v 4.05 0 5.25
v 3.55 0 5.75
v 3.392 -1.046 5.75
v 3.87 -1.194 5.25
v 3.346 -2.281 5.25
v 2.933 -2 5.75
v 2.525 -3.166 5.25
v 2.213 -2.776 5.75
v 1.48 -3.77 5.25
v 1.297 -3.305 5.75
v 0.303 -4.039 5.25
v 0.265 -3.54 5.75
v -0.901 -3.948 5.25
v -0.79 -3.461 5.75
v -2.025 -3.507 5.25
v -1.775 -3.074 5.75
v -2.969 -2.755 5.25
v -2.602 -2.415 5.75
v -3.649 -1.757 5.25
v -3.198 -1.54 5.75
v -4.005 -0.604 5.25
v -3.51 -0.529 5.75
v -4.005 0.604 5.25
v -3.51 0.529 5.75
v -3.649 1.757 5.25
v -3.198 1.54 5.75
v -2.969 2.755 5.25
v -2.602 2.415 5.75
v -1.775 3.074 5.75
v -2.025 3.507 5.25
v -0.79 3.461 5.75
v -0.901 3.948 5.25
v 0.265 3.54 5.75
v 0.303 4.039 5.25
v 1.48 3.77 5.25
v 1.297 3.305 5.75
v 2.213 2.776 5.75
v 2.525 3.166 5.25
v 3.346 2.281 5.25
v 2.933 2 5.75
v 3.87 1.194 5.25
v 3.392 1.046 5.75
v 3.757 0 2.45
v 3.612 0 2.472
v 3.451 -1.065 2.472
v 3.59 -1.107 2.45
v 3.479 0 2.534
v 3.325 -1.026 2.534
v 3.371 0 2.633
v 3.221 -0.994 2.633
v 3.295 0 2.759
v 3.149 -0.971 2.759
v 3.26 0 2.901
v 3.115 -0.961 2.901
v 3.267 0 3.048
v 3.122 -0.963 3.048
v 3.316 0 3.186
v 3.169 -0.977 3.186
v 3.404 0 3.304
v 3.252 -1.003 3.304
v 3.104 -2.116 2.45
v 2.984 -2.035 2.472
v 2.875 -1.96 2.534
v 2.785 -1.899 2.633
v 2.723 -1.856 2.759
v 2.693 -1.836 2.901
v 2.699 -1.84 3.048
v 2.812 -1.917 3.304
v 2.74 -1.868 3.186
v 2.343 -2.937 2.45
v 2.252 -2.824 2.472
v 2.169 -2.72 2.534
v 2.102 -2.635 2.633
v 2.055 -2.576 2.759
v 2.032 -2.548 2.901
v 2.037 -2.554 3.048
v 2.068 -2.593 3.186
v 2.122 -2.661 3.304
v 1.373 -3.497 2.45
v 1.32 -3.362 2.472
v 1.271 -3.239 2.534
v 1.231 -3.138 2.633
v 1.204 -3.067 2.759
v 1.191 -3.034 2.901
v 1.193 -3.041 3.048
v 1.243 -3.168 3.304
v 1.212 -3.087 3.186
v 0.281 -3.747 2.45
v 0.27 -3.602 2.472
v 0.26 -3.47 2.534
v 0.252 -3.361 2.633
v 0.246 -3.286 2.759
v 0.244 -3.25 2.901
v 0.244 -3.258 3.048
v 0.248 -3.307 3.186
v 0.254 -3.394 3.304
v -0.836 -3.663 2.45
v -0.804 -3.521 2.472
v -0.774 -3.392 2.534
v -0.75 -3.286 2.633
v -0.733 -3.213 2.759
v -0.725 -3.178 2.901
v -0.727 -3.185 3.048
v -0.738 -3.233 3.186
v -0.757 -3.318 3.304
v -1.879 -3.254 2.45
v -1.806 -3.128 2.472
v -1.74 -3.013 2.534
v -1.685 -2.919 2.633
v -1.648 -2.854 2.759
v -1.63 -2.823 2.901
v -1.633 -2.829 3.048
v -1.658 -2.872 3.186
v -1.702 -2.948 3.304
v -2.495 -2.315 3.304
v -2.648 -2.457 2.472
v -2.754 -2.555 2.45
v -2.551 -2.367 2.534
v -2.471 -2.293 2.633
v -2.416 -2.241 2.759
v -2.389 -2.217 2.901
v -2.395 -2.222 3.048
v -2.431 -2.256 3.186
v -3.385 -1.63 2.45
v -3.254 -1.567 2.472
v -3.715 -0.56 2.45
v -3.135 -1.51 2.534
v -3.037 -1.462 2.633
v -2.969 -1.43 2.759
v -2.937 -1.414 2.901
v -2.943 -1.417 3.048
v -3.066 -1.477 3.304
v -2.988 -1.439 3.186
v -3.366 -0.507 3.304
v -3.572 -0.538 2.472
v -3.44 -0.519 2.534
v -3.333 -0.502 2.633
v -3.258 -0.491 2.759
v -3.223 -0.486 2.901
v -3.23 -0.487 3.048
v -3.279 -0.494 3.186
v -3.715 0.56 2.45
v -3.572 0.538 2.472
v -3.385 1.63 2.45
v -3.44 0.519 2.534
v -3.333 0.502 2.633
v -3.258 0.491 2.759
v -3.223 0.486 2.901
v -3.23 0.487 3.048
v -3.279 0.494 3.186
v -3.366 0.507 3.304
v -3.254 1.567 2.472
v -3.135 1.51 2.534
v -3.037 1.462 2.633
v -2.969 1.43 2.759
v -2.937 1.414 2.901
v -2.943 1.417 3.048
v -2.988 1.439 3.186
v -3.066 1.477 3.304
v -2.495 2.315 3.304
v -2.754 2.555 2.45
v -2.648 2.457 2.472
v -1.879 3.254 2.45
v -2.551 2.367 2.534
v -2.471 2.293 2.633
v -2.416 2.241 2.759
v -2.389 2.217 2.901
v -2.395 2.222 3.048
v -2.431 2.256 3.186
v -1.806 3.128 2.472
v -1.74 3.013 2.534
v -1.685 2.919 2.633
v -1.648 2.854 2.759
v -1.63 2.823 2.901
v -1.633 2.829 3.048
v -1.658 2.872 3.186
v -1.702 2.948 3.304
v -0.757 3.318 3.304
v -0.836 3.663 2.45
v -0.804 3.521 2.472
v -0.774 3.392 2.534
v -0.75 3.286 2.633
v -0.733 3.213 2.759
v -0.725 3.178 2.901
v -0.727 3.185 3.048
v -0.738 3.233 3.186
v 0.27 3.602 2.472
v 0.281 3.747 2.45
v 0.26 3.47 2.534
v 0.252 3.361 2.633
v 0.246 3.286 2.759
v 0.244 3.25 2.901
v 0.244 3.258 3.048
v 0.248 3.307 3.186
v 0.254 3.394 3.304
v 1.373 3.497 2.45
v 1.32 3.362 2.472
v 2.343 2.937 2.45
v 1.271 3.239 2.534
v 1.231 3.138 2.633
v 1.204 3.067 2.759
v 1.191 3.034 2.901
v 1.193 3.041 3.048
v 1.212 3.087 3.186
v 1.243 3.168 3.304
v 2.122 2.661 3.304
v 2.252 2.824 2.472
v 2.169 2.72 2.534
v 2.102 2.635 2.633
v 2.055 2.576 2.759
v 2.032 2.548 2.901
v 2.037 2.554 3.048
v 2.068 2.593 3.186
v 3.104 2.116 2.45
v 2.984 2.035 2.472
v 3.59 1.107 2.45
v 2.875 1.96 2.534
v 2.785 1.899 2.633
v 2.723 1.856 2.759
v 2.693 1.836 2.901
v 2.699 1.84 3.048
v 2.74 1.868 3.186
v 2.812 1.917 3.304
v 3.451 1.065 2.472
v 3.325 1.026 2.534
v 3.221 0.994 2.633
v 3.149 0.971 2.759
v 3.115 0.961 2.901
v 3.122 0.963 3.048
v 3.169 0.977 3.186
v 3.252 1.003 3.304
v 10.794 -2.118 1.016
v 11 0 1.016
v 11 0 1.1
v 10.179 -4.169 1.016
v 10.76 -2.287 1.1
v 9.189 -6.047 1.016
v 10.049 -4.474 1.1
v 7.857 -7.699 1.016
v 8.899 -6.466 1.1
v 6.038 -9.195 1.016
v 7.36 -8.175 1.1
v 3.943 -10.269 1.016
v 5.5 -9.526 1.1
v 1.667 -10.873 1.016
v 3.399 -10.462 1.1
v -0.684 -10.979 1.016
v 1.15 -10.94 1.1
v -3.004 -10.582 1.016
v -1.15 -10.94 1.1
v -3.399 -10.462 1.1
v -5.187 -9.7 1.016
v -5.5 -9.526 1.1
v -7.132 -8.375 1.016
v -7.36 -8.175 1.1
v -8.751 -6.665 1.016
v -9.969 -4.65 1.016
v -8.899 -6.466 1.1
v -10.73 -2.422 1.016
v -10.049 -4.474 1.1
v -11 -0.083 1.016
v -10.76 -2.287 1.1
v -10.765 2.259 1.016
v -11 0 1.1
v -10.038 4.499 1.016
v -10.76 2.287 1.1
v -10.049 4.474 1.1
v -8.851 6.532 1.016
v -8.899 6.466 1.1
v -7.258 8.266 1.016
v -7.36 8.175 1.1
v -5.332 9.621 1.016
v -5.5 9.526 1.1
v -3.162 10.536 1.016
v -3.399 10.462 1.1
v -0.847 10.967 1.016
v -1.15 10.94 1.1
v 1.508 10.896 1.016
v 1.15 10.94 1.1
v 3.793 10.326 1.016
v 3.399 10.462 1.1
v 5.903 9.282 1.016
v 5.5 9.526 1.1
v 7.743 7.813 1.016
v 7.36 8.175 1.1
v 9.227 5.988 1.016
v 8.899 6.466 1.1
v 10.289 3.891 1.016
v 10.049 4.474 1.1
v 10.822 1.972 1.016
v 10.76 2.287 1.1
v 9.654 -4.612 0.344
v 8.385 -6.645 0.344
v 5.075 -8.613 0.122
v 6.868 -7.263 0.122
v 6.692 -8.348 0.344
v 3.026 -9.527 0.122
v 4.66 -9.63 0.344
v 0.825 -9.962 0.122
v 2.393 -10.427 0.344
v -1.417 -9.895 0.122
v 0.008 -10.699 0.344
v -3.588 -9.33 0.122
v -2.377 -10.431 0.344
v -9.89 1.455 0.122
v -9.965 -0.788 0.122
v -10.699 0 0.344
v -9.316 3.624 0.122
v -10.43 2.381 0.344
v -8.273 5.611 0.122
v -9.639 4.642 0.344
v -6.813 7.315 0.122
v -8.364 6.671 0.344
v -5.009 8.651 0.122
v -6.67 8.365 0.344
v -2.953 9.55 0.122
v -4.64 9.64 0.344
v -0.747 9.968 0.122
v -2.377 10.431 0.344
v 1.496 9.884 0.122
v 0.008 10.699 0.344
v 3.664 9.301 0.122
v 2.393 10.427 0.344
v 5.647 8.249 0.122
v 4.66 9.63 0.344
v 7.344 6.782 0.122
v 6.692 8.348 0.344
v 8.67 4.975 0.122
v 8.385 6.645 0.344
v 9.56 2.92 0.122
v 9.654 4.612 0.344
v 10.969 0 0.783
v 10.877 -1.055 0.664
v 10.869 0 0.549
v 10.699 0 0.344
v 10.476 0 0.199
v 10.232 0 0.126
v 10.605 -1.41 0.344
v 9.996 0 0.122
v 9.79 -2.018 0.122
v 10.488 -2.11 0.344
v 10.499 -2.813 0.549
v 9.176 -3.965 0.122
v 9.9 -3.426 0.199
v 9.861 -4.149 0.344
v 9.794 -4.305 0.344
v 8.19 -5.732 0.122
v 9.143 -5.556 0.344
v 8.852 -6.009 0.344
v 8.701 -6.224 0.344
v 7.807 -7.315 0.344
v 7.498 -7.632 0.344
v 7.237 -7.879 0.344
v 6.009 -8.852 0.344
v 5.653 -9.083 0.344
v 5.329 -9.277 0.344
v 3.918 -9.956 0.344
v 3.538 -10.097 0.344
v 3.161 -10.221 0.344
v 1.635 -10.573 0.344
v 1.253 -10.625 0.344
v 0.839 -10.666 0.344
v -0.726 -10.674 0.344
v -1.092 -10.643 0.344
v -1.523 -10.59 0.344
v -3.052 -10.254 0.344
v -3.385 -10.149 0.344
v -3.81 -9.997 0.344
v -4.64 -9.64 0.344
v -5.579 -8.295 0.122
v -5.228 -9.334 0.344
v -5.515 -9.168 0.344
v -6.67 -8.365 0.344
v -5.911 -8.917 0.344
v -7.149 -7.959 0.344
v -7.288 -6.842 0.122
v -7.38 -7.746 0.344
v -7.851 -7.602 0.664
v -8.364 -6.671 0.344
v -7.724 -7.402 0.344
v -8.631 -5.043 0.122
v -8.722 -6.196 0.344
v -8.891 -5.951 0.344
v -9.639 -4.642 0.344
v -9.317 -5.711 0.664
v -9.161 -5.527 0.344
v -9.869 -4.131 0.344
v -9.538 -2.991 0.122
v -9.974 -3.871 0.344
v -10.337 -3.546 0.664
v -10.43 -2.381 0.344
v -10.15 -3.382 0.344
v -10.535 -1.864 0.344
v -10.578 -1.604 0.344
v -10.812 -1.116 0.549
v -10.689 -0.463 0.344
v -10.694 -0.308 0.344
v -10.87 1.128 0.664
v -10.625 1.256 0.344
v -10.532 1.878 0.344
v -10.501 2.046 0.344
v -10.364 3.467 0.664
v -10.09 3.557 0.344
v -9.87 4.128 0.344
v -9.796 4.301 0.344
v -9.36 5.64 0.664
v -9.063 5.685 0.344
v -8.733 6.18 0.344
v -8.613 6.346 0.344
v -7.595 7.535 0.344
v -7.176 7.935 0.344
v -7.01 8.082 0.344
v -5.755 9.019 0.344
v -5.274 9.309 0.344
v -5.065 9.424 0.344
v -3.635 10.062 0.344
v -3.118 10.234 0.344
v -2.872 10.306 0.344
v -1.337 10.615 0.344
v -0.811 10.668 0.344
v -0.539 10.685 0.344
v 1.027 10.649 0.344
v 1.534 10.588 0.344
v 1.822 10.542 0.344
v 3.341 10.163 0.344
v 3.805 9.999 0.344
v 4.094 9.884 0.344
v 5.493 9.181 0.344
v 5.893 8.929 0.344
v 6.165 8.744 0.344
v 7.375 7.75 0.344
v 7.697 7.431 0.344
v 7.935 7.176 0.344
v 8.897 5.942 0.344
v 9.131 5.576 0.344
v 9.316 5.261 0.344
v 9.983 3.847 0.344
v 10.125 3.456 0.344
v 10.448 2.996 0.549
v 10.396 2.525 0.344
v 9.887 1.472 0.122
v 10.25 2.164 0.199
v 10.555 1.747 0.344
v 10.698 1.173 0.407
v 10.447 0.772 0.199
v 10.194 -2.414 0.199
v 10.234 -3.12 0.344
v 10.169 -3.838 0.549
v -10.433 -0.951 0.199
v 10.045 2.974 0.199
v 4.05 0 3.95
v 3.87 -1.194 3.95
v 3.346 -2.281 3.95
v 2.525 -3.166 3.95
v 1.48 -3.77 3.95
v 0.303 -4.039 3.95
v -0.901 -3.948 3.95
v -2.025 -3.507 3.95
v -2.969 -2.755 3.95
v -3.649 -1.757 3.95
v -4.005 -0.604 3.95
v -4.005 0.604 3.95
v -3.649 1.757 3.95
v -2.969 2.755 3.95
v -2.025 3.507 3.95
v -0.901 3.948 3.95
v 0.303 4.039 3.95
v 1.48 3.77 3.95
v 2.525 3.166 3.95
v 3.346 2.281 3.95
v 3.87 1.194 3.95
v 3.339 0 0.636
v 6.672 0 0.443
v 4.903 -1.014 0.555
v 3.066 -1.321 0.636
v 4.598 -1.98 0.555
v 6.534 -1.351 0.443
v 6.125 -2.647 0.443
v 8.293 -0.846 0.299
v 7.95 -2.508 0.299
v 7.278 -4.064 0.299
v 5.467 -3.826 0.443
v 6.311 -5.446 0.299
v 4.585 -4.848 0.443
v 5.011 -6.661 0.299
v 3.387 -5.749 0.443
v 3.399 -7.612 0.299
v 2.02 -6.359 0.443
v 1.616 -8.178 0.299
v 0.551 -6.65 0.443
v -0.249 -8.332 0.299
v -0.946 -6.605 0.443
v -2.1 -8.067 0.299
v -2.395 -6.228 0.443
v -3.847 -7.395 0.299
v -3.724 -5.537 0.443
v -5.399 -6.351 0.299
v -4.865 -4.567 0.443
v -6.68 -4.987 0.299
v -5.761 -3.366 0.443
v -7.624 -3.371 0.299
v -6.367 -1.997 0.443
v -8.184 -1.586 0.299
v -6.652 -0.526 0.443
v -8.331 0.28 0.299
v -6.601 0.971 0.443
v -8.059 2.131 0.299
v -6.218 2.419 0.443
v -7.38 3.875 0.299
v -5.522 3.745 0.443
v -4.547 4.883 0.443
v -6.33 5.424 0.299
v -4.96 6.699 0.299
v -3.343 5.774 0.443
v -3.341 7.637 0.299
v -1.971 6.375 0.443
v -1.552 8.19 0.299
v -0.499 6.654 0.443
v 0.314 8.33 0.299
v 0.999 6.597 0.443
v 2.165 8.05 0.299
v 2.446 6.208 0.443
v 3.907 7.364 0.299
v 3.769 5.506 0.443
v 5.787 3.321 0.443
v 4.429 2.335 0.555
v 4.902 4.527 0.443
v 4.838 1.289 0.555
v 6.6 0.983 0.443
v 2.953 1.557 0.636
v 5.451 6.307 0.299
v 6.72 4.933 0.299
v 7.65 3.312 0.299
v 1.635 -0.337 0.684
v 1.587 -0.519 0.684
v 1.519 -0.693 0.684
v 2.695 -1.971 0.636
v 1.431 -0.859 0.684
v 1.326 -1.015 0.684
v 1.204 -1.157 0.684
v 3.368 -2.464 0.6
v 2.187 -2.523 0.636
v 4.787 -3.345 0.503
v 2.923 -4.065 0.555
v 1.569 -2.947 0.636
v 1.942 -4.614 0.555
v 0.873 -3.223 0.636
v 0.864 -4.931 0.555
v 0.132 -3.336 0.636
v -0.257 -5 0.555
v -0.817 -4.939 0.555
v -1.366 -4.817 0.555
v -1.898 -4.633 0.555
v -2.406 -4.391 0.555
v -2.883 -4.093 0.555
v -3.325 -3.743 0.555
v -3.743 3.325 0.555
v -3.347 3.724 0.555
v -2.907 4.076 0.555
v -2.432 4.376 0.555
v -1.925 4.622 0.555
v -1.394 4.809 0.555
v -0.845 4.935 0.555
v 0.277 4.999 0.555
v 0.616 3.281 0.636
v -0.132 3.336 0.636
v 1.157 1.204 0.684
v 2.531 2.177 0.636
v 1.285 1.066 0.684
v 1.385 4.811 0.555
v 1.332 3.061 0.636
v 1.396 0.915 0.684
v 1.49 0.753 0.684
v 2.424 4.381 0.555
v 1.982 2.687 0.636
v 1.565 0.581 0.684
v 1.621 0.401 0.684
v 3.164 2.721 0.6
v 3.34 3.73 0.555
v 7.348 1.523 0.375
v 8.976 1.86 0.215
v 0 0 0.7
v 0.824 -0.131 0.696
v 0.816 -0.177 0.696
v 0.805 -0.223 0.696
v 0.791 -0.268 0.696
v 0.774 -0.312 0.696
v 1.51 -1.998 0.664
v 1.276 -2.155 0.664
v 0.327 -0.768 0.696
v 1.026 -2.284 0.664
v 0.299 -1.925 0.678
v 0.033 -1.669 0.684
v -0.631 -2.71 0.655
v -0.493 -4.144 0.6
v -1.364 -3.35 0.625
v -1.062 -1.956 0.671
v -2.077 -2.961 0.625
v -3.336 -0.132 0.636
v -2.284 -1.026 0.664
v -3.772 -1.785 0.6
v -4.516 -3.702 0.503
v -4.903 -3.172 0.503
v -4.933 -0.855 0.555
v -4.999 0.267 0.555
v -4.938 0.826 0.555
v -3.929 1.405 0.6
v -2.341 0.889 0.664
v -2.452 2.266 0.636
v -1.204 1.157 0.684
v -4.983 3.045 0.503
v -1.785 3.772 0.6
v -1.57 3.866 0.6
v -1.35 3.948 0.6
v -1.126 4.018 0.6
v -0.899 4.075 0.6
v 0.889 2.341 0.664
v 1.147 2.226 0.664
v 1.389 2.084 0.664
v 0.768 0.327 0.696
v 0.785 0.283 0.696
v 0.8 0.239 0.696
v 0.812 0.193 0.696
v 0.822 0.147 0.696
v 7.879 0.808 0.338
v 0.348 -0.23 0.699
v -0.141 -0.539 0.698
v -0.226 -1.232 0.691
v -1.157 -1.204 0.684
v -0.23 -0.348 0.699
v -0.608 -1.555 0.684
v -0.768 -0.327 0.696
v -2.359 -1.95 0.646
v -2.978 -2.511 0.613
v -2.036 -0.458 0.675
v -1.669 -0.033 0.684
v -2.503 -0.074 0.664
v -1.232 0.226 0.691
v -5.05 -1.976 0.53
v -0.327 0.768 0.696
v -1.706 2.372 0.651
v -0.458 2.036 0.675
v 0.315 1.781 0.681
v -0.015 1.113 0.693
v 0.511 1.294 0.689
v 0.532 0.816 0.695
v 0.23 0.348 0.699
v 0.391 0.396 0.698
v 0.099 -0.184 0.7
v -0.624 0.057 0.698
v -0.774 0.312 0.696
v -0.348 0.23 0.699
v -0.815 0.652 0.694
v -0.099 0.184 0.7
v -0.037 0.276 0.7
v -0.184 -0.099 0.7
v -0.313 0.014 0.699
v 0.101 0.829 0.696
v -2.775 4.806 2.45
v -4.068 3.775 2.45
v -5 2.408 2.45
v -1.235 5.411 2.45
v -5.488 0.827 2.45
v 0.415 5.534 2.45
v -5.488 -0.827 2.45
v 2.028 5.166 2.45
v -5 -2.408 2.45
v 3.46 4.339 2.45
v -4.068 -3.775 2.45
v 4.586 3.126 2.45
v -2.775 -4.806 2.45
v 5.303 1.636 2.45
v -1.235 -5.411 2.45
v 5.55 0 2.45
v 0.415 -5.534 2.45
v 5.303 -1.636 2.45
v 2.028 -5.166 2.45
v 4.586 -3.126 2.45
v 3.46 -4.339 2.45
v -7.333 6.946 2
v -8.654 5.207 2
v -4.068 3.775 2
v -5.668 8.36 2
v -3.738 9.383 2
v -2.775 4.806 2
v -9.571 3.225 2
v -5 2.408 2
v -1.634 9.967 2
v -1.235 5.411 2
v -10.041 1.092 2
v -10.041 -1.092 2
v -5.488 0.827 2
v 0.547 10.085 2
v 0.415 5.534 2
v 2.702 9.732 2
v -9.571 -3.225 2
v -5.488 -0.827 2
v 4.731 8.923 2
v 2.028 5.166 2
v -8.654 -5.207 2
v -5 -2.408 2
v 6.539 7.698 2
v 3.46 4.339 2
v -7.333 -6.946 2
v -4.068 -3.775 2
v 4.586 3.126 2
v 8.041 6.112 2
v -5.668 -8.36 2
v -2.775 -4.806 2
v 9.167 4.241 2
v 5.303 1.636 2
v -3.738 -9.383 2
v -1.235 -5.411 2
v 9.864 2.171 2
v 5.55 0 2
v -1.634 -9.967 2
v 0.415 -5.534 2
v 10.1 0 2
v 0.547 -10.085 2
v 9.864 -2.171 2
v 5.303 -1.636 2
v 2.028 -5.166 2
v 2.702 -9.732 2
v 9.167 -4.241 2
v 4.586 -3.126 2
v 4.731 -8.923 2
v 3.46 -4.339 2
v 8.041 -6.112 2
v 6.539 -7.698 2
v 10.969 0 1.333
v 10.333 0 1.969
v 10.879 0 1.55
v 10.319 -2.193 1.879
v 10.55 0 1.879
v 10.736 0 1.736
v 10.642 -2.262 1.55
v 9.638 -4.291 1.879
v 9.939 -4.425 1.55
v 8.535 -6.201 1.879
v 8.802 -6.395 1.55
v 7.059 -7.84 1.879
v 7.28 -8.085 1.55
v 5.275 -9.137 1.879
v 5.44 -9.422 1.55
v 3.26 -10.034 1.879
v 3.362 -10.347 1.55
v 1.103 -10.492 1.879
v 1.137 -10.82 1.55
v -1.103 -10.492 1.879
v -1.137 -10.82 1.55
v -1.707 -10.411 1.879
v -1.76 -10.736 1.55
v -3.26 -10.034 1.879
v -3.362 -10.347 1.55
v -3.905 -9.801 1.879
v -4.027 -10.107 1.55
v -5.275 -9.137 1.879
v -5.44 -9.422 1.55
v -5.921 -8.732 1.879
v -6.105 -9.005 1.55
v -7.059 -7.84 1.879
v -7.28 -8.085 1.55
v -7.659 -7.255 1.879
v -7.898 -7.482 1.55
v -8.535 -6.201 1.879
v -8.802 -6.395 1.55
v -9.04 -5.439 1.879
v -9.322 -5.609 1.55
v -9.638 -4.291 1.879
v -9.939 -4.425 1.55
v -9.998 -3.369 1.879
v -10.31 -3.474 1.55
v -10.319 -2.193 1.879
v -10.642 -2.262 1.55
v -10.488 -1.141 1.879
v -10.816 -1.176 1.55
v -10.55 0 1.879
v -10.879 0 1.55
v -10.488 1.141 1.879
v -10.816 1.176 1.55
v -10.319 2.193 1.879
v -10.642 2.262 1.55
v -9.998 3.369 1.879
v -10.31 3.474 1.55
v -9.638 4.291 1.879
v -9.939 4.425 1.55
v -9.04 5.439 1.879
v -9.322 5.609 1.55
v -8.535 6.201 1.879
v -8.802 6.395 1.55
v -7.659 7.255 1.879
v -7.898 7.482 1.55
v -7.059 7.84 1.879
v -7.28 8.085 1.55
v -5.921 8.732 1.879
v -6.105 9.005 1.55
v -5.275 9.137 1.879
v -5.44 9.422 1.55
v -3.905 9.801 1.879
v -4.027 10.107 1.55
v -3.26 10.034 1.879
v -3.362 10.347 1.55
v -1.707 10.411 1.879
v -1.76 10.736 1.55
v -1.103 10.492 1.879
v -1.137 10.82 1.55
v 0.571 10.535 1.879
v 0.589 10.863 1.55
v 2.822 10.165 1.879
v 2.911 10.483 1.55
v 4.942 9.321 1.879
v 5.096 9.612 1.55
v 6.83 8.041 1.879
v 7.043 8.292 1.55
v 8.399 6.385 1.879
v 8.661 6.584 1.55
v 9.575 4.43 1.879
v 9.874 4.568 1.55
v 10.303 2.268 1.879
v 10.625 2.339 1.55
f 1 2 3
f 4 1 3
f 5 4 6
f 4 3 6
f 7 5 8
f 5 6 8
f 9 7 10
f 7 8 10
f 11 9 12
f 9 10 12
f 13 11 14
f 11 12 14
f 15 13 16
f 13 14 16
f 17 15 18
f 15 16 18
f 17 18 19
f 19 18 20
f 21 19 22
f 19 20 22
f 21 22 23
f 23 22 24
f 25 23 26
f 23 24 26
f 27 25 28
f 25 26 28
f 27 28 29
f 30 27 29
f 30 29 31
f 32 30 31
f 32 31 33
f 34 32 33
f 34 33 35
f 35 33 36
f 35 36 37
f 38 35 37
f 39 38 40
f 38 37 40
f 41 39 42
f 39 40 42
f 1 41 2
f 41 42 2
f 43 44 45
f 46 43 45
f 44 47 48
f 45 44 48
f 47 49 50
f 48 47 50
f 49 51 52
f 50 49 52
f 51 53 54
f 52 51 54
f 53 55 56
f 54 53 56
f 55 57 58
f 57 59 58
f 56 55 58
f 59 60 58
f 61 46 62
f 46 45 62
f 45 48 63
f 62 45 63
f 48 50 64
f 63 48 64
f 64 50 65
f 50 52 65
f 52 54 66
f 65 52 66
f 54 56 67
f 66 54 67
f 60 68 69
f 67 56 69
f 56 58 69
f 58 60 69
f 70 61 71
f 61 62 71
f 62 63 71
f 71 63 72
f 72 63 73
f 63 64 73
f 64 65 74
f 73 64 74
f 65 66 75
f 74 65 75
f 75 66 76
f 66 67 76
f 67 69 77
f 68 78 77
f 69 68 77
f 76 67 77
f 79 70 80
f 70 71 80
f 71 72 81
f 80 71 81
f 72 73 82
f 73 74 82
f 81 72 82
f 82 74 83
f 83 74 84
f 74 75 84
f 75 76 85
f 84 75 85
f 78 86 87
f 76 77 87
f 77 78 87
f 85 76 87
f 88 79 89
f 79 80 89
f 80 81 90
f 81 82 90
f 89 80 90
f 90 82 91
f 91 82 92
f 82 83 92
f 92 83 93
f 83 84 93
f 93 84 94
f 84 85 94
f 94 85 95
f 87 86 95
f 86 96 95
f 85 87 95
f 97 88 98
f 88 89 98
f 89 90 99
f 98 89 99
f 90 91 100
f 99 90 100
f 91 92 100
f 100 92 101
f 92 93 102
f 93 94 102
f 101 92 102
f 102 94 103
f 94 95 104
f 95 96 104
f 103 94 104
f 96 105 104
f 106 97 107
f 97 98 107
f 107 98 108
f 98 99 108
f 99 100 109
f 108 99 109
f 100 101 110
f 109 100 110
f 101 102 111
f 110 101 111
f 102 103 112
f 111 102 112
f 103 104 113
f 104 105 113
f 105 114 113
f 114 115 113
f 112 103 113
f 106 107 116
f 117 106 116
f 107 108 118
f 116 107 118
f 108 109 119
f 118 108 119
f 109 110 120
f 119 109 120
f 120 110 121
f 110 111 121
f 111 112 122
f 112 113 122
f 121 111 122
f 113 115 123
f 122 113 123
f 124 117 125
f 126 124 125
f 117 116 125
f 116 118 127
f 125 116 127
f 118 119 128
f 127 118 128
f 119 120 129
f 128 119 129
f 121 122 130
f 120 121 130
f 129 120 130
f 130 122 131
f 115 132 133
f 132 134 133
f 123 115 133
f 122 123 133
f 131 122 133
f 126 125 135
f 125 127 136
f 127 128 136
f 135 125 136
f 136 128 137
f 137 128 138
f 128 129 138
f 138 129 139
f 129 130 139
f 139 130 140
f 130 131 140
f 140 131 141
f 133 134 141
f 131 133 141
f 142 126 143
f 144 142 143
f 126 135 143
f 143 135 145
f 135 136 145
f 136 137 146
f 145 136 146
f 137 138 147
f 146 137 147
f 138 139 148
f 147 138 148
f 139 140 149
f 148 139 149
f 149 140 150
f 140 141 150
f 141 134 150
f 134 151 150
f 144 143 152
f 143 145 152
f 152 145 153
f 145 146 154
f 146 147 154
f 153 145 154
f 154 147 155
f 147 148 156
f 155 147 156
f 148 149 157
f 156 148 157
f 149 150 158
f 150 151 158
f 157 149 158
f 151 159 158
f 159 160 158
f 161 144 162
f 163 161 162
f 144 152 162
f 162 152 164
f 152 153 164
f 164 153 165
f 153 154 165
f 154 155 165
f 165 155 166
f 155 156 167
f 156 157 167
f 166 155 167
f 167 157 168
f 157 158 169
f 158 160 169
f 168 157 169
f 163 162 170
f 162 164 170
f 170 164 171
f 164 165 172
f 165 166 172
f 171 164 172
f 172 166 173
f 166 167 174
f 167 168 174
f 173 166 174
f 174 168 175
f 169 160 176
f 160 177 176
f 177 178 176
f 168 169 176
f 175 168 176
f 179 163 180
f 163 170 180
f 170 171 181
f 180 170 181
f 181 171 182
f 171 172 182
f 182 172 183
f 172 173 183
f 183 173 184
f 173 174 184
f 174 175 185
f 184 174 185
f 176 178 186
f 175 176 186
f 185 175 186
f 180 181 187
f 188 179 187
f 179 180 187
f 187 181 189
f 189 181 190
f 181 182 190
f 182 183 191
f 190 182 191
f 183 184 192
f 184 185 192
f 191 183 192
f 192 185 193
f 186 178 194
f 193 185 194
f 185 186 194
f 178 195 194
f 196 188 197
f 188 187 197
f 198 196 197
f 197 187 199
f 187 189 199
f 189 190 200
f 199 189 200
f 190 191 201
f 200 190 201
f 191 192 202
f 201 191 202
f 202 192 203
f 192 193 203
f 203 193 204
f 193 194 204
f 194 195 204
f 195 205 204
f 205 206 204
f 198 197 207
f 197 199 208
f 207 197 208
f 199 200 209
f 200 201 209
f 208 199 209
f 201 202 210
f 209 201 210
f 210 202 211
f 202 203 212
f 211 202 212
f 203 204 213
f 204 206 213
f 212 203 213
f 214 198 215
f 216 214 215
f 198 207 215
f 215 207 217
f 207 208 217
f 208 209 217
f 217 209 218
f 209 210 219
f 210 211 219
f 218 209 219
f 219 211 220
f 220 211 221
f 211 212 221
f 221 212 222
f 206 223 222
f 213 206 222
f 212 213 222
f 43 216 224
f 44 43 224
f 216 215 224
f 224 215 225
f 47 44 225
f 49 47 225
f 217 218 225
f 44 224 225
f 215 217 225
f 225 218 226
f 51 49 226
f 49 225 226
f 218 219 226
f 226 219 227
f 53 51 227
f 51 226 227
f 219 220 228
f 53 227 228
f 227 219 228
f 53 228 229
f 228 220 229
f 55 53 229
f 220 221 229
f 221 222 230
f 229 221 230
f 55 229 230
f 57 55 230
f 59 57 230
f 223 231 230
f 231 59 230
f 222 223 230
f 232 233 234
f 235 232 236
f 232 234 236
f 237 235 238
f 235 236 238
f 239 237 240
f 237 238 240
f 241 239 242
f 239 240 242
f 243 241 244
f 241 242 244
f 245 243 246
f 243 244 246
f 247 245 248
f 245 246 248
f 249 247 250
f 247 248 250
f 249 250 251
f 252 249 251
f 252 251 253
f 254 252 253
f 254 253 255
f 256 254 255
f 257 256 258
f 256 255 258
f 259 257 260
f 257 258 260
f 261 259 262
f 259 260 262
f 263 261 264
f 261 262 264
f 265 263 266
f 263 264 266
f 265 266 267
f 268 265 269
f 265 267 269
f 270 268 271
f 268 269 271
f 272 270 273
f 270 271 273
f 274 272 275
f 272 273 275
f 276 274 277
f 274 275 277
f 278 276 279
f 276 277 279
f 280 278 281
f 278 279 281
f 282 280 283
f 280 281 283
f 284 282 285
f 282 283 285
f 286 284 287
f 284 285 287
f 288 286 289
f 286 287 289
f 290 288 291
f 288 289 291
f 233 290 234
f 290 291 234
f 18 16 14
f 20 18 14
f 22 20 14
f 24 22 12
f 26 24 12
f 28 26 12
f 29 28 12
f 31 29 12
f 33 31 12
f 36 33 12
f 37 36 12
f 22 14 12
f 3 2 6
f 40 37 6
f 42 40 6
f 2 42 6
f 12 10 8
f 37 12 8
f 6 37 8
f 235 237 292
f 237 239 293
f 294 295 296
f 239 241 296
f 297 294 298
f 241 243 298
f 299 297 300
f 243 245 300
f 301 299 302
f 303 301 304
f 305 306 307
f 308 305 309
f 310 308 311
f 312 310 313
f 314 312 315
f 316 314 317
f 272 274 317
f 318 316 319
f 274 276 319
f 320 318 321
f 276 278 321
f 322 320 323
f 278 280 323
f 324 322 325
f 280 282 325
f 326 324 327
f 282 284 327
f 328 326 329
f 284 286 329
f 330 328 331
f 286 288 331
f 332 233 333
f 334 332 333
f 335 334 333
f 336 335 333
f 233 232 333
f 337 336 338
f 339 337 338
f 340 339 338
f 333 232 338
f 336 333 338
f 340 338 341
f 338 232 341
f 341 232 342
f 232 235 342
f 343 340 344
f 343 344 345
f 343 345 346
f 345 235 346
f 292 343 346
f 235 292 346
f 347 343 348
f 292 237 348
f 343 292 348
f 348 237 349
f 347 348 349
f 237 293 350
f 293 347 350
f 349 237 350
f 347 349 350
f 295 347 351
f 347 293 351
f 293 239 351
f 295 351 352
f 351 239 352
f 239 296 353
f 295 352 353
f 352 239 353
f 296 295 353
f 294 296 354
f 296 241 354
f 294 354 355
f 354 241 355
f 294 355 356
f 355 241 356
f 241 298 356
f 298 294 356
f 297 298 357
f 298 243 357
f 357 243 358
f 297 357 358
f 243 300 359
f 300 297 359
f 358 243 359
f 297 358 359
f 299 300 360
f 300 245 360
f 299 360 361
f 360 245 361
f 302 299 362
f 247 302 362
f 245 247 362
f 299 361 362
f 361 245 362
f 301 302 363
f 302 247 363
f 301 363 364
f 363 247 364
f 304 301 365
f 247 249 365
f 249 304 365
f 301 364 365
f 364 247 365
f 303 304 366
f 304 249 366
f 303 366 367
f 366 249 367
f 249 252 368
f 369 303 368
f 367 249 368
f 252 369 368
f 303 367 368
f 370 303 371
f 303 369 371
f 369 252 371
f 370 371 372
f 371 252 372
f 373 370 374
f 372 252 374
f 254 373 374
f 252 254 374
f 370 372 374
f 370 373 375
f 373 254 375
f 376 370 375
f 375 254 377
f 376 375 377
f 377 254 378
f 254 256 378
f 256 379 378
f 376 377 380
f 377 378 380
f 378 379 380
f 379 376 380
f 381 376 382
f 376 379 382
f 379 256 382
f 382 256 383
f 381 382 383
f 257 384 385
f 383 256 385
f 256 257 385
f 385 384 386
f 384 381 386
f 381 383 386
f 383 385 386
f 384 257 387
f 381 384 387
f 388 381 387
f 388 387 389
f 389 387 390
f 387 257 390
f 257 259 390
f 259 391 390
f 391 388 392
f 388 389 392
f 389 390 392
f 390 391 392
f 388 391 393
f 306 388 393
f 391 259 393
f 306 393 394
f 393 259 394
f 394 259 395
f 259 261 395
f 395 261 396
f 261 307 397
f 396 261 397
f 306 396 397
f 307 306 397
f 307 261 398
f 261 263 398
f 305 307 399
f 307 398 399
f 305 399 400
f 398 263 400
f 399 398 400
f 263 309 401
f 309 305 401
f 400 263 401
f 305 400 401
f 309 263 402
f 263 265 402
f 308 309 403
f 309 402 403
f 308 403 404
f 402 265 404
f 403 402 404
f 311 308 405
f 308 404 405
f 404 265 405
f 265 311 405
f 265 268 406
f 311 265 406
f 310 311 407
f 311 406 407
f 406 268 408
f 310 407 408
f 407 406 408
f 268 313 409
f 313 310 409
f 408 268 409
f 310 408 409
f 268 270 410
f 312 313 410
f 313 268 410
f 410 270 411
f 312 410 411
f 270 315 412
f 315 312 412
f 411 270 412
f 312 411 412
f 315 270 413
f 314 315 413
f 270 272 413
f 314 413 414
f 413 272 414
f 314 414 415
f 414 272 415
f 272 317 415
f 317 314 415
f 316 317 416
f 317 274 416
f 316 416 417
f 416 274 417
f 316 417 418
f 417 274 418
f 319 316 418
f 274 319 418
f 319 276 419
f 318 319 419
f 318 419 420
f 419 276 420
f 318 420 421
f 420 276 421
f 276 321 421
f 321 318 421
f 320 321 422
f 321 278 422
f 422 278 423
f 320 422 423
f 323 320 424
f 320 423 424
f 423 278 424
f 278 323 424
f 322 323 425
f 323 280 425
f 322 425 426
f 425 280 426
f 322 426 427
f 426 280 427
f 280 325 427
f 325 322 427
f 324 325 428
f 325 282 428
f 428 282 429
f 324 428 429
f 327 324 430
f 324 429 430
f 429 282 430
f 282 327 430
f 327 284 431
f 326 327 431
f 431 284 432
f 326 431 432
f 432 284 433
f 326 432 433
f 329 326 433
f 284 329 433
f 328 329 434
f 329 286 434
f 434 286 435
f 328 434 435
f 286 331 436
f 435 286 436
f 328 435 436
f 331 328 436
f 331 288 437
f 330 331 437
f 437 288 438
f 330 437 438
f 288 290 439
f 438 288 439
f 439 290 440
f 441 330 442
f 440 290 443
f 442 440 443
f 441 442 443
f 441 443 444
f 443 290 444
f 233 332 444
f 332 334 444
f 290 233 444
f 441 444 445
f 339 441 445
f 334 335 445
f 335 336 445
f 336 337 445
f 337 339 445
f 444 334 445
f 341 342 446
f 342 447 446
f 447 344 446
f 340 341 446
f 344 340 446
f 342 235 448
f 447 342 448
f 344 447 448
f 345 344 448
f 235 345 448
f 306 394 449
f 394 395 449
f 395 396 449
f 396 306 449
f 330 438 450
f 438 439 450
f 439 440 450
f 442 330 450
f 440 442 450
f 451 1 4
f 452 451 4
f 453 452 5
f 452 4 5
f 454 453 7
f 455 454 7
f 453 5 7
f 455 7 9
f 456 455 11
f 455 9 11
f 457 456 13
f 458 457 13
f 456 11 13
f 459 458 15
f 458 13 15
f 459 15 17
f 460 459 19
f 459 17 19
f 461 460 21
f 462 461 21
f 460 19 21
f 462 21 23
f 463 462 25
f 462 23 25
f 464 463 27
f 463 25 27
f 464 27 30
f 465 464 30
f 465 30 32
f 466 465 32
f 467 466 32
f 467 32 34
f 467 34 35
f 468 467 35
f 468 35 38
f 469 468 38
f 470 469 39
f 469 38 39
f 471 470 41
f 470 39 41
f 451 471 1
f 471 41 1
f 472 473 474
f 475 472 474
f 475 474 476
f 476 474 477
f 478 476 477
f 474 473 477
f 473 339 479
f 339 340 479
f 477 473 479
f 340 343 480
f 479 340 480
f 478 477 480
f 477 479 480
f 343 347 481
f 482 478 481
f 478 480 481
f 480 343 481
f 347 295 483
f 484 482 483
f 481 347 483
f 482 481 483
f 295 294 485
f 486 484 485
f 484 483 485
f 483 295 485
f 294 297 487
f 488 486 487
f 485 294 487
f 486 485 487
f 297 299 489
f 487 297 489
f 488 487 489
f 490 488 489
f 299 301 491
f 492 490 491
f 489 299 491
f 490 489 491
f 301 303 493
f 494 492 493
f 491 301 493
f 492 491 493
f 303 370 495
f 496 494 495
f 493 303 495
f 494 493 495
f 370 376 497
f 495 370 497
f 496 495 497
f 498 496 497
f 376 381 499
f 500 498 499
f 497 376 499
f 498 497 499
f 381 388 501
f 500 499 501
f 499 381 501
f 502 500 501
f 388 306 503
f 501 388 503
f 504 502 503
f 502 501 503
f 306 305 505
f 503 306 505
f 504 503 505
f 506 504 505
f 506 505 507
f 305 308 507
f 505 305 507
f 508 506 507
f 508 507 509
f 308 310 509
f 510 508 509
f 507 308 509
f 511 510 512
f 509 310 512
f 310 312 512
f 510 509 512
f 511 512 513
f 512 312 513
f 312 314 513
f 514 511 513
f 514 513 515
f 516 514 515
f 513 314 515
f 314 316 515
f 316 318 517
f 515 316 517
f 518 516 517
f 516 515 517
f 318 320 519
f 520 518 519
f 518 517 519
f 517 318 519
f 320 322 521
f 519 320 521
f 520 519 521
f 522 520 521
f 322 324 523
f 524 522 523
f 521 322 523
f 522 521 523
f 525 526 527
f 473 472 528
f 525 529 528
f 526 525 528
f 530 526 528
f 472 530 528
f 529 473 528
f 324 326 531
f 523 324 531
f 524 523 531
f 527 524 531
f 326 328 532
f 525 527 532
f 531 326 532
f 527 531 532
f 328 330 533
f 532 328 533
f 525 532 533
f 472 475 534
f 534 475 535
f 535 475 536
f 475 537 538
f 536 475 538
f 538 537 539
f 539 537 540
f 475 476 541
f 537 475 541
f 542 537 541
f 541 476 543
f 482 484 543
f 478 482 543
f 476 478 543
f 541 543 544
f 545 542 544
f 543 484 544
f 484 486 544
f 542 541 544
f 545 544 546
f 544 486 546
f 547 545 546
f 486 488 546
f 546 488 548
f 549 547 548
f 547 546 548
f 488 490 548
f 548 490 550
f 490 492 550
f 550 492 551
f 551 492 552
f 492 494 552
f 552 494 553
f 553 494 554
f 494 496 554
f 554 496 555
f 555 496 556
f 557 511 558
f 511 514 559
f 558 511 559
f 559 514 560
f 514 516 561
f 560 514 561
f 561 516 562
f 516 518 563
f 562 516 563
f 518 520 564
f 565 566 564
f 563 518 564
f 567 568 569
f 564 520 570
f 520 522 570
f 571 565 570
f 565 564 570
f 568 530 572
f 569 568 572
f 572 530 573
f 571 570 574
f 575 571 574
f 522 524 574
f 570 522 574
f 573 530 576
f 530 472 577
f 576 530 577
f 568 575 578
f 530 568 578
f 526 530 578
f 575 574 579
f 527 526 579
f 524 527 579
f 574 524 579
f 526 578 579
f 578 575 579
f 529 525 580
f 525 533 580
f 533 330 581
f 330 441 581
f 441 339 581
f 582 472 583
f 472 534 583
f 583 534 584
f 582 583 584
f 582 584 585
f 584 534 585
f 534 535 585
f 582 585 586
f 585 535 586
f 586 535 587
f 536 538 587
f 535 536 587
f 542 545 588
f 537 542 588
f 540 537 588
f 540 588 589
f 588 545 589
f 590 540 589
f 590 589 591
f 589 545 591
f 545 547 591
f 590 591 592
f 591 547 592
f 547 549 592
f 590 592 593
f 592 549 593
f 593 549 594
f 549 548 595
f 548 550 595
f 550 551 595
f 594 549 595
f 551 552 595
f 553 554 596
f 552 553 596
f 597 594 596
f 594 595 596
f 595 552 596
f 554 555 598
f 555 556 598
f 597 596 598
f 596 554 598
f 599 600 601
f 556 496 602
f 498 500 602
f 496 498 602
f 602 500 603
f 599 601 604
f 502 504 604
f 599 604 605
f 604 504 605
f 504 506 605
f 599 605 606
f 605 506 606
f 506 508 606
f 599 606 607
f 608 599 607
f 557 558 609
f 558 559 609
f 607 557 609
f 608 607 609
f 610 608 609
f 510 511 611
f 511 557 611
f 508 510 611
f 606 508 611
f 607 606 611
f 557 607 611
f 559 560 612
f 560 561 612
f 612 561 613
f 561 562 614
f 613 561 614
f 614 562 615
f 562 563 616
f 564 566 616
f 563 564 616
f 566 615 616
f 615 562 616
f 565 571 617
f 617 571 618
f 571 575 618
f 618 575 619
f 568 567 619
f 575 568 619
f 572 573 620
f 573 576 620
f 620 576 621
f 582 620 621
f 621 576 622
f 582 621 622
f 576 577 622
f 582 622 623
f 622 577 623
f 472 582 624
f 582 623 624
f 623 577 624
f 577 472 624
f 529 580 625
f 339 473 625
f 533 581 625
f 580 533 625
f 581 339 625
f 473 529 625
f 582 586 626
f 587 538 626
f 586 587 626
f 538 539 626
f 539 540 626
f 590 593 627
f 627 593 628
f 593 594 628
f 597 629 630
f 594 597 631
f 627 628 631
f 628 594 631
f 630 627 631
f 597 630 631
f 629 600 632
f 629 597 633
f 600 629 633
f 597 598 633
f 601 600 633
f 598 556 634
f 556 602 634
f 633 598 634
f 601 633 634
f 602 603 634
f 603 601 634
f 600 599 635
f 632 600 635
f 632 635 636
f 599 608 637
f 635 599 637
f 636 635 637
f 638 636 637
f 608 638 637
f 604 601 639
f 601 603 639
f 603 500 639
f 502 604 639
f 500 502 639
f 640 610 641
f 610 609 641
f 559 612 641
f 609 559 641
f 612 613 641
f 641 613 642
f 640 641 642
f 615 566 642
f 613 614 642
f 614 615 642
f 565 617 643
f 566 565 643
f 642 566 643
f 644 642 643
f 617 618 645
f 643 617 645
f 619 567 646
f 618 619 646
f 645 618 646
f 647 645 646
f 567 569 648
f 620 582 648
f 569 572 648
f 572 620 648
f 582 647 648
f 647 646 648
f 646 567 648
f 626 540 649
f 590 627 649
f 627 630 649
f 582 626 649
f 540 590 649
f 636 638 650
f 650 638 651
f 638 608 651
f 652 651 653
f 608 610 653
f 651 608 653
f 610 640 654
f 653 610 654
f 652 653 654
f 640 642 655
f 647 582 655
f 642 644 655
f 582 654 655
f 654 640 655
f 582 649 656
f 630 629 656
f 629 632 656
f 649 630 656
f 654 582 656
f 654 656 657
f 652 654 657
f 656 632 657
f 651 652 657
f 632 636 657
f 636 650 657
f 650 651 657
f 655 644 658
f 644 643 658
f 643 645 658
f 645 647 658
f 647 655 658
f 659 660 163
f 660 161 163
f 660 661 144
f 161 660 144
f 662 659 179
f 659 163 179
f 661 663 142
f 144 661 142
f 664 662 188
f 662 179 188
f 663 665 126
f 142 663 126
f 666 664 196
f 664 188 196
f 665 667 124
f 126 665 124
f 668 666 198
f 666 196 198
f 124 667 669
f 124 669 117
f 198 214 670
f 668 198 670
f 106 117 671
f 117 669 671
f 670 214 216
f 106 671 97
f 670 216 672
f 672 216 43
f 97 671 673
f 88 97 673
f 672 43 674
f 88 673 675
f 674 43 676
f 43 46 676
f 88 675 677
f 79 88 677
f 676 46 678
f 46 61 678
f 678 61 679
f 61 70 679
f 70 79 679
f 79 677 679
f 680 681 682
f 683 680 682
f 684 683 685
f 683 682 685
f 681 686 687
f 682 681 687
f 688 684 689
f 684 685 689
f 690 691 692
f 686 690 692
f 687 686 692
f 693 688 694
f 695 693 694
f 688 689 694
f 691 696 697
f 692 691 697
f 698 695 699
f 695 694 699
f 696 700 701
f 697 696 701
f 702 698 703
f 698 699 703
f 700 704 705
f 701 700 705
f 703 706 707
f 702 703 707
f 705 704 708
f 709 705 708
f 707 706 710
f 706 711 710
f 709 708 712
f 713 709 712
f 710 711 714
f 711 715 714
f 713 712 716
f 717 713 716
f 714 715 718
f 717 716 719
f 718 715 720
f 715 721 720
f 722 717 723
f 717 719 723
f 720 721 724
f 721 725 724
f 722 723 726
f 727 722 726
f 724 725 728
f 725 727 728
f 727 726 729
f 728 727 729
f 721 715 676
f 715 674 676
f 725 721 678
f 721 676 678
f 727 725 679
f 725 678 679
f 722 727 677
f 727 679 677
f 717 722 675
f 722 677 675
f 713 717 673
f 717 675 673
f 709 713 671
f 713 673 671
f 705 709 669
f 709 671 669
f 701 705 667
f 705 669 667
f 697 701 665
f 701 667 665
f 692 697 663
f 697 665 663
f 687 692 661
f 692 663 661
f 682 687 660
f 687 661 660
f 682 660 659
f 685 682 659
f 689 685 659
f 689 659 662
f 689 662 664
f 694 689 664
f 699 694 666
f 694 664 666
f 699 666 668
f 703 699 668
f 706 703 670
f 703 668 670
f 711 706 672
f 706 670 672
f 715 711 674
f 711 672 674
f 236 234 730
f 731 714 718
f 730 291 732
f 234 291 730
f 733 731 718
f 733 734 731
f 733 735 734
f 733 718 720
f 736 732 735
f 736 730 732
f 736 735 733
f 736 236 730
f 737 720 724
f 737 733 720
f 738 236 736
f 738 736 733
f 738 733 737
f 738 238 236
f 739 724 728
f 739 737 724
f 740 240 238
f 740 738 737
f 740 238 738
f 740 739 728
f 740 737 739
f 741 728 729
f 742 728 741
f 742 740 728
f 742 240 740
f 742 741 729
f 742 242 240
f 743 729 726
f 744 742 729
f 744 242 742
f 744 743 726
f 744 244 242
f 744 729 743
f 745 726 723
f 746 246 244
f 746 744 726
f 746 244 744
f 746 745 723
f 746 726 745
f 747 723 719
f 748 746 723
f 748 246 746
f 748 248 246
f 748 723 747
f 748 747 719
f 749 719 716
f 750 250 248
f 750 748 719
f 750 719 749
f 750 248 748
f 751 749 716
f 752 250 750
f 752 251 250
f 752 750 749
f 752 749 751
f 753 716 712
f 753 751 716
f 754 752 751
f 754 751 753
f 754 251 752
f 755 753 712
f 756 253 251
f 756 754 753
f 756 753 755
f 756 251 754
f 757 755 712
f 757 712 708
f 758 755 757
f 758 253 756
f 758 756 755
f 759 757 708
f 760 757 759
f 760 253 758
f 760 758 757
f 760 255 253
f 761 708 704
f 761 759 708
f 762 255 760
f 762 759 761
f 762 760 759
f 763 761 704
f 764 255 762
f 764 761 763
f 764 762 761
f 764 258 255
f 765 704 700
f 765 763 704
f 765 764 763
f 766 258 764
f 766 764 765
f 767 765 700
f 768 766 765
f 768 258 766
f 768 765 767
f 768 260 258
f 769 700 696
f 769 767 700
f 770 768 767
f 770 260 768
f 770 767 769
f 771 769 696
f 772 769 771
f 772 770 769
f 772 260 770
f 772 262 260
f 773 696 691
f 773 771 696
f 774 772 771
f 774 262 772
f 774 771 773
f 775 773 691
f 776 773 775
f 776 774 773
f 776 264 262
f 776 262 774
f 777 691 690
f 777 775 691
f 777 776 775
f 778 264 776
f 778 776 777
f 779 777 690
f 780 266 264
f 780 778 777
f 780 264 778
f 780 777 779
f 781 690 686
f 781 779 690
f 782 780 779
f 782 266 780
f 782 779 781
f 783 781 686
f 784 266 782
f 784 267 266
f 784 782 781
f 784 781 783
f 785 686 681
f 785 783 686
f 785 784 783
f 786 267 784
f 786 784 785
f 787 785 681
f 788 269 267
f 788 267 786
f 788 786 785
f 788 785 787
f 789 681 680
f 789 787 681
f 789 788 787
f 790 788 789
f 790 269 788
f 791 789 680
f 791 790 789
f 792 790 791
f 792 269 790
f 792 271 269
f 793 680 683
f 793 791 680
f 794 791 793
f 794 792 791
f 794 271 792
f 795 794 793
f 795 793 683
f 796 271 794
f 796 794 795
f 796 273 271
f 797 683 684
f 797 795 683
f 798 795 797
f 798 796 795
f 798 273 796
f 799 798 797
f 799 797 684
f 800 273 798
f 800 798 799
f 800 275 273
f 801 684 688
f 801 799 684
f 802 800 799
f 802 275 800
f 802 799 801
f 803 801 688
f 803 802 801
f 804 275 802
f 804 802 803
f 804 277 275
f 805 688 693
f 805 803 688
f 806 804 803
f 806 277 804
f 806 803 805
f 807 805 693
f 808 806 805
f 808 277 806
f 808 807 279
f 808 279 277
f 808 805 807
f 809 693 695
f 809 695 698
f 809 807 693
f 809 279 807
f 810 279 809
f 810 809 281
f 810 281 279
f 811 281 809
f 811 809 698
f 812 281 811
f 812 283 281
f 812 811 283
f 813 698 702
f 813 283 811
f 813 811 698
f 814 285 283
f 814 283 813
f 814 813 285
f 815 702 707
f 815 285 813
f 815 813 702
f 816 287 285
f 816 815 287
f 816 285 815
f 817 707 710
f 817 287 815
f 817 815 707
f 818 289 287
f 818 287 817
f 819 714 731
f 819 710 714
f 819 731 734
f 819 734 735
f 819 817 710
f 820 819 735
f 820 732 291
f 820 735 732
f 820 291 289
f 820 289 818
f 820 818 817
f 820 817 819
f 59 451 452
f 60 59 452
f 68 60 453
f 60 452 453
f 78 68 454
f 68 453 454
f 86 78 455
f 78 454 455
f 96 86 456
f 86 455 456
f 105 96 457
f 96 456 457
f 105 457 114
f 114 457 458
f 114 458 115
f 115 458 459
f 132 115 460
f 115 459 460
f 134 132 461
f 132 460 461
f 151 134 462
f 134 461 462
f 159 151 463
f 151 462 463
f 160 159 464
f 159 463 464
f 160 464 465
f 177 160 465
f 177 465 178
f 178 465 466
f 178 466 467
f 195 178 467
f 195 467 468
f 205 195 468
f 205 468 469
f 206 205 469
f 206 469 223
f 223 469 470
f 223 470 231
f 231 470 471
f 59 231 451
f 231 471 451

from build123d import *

# Parameters (mm, degrees)
F2_R    = 0.5
F3_R    = 0.9
F4_SIZE = 0.5


with BuildPart() as f1:
    # F0 (on Front) → F1 (revolve)
    with BuildSketch(Plane.XZ):
        with BuildLine():
            ThreePointArc((0, 0.7), (5.511125, 0.524823), (11, 0))
            Line((11, 0), (11, 2))
            Line((11, 2), (5.55, 2))
            Line((5.55, 2), (5.55, 2.45))
            Line((5.55, 2.45), (2.55, 2.45))
            Line((2.55, 2.45), (4.05, 3.95))
            Line((4.05, 3.95), (4.05, 5.75))
            Line((4.05, 5.75), (0, 5.75))
            Line((0, 5.75), (0, 0.7))
        make_face()
    revolve(axis=Axis((0, 0, 3.225), (0, 0, -1)))

    # F2
    f2_edges = [f1.edges().sort_by_distance(p)[0] for p in [
        (-2.55, 0, 2.45),
    ]]
    fillet(f2_edges, radius=F2_R)

    # F3
    f3_edges = [f1.edges().sort_by_distance(p)[0] for p in [
        (-11, 0, 0),
        (-11, 0, 2),
    ]]
    fillet(f3_edges, radius=F3_R)

    # F4
    f4_edges = [f1.edges().sort_by_distance(p)[0] for p in [
        (-4.05, 0, 5.75),
    ]]
    chamfer(f4_edges, length=F4_SIZE)


solid = f1.part
